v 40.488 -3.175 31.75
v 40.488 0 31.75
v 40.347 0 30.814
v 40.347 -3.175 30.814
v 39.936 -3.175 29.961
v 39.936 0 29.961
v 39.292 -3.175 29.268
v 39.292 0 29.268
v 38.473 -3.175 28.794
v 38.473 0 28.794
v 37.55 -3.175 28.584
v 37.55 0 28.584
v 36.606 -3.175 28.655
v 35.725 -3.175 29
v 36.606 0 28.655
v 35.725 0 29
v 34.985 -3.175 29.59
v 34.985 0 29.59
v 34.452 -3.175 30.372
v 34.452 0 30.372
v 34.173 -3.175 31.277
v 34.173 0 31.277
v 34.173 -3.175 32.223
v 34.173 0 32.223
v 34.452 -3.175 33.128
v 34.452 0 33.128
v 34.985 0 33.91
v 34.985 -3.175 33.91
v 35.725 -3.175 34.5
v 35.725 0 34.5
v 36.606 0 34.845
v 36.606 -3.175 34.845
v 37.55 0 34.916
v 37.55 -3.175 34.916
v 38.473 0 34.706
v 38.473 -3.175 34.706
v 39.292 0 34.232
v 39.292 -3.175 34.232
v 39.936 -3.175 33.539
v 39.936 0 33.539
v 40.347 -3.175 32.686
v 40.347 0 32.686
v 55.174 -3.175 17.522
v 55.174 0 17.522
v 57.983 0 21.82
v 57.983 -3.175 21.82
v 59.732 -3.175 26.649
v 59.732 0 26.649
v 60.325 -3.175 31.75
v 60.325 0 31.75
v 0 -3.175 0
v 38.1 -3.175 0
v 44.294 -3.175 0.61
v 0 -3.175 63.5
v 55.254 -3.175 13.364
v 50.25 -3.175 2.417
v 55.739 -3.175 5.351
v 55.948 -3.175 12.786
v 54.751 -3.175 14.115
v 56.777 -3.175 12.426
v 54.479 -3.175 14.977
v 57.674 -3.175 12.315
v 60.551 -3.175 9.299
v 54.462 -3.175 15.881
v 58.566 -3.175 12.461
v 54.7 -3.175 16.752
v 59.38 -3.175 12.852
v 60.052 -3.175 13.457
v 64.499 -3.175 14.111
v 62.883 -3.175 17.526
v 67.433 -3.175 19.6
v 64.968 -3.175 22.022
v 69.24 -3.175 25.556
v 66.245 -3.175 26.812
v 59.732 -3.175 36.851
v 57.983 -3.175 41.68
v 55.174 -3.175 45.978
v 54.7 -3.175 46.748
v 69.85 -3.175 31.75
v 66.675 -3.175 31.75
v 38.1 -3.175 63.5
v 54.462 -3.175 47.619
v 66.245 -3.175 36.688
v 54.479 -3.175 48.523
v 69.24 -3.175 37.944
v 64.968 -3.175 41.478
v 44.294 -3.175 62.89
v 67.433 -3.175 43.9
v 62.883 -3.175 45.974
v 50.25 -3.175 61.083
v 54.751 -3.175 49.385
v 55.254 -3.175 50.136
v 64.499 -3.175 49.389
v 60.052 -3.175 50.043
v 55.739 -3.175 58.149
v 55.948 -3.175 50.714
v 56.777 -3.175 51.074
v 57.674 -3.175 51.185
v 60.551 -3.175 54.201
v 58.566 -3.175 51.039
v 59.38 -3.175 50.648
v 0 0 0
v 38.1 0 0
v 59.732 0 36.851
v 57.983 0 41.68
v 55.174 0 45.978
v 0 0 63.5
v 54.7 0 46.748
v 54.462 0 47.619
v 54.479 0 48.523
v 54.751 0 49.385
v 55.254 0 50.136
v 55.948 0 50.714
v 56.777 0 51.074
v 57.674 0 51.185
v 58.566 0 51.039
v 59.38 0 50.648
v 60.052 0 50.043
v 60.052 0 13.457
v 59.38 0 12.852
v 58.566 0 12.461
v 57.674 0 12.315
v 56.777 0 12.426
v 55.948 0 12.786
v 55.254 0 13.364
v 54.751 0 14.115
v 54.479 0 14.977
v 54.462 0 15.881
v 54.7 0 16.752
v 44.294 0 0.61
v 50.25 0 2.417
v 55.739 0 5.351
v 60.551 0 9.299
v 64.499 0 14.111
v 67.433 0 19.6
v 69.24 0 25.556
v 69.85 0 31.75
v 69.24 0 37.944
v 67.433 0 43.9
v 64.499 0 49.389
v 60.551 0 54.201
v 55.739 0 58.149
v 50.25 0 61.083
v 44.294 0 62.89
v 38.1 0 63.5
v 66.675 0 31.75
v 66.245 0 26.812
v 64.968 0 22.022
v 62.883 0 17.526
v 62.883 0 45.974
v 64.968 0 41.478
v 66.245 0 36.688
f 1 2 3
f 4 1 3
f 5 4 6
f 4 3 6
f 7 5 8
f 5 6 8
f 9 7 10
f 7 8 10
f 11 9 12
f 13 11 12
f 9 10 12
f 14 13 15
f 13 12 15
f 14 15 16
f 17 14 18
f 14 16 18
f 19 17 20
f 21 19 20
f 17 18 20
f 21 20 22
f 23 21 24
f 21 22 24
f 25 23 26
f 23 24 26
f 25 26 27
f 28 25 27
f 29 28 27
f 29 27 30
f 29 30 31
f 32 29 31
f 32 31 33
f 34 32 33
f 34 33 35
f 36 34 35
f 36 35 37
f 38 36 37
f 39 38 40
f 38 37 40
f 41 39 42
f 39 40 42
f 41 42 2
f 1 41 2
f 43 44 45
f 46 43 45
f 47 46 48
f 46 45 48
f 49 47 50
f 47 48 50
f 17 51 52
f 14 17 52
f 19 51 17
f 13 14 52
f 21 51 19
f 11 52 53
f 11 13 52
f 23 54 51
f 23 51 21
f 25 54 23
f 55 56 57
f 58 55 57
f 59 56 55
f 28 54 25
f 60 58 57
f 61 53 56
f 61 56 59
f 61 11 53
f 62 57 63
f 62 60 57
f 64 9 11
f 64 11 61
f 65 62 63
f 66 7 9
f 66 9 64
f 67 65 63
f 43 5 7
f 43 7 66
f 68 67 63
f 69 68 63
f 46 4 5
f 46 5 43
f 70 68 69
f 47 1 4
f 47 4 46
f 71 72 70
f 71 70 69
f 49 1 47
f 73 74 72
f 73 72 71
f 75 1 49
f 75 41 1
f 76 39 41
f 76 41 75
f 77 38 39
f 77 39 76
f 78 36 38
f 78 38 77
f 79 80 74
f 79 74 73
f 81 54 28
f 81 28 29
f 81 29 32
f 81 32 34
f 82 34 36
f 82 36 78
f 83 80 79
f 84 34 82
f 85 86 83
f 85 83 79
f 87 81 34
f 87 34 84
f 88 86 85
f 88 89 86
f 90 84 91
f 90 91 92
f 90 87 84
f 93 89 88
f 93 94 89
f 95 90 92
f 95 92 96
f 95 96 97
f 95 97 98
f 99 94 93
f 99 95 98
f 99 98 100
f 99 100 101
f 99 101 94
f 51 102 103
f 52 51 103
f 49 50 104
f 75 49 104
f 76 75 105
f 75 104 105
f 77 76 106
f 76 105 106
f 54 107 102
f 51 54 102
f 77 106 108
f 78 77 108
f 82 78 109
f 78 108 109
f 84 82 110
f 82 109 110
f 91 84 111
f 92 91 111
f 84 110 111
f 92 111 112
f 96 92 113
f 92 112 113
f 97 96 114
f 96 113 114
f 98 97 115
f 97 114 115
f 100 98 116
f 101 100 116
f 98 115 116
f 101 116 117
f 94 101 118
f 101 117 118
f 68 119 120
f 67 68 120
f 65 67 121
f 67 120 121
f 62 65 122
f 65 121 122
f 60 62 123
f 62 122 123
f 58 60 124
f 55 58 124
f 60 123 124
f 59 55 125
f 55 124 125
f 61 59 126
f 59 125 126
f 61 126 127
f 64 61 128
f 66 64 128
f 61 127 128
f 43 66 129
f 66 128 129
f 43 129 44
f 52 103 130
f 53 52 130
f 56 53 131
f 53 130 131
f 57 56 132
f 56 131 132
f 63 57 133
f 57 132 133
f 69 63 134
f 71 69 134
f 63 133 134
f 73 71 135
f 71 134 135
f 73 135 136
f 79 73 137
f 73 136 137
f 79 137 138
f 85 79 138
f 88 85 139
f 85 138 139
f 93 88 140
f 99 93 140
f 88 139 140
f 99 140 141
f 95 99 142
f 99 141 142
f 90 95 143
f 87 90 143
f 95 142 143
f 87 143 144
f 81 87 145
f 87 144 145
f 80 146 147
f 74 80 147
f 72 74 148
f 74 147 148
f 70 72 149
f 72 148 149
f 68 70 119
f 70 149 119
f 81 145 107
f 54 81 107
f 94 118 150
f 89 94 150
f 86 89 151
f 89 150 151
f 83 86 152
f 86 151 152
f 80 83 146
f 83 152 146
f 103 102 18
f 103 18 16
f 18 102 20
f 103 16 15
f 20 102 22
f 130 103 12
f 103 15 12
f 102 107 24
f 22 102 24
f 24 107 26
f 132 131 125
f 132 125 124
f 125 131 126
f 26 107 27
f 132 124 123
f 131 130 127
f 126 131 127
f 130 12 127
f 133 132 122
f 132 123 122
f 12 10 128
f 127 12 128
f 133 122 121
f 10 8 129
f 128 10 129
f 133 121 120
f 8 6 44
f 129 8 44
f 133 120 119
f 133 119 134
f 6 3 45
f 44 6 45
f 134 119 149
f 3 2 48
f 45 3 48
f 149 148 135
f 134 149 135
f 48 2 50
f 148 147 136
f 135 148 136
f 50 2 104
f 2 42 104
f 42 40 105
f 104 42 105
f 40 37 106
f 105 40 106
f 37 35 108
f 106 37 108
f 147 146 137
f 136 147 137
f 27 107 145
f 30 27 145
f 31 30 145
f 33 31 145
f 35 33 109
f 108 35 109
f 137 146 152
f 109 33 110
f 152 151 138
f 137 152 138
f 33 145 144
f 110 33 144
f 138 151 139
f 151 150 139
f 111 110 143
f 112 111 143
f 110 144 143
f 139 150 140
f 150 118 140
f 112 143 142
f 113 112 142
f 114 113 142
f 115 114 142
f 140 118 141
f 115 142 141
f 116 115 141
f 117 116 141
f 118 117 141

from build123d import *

# Parameters (mm, degrees)
F1_DEPTH = 3.175
F3_DEPTH = 3.175


# Not quite as in the source:
# - a feature names something its author has since deleted; it is built from what else it names


with BuildPart() as f1:
    # F0 (on Front) → F1 (new body)
    with BuildSketch(Plane.XZ):
        with BuildLine():
            Line((0, 63.5), (0, 0))
            Line((0, 0), (38.1, 0))
            ThreePointArc((38.1, 0), (60.5506403027, 9.2993596973), (69.85, 31.75))
            ThreePointArc((69.85, 31.75), (60.5506403027, 54.2006403027), (38.1, 63.5))
            Line((38.1, 63.5), (0, 63.5))
        make_face()
        with BuildLine():
            ThreePointArc((60.0519230645, 50.0432692204), (64.9682603323, 41.4776519117), (66.675, 31.75))
            ThreePointArc((66.675, 31.75), (64.9682603323, 22.0223480883), (60.0519230645, 13.4567307796))
            ThreePointArc((60.0519230645, 13.4567307796), (9.525, 31.75), (60.0519230645, 50.0432692204))
        make_face(mode=Mode.SUBTRACT)
        with BuildLine():
            ThreePointArc((55.1737179391, 17.5219017175), (58.997535814, 24.1840485131), (60.325, 31.75))
            ThreePointArc((60.325, 31.75), (58.997535814, 39.3159514869), (55.1737179391, 45.9780982825))
            ThreePointArc((55.1737179391, 45.9780982825), (15.875, 31.75), (55.1737179391, 17.5219017175))
        make_face()
        with BuildLine():
            ThreePointArc((55.1737179391, 45.9780982825), (55.5802350328, 50.4497863142), (60.0519230645, 50.0432692204))
            ThreePointArc((60.0519230645, 50.0432692204), (9.525, 31.75), (60.0519230645, 13.4567307796))
            ThreePointArc((60.0519230645, 13.4567307796), (55.5802350328, 13.0502136858), (55.1737179391, 17.5219017175))
            ThreePointArc((55.1737179391, 17.5219017175), (15.875, 31.75), (55.1737179391, 45.9780982825))
        make_face()
    extrude(amount=F1_DEPTH)

    # F2 (on face) → F3 (cut)
    with BuildSketch(Plane(origin=(0, 0, 0), x_dir=(-1, 0, 0), z_dir=(0, 1, 0))):
        with BuildLine():
            ThreePointArc((-34.1376, 31.75), (-37.3126, 34.925), (-40.4876, 31.75))
            ThreePointArc((-40.4876, 31.75), (-37.3126, 28.575), (-34.1376, 31.75))
        make_face()
    extrude(amount=-F3_DEPTH, mode=Mode.SUBTRACT)


solid = f1.part
